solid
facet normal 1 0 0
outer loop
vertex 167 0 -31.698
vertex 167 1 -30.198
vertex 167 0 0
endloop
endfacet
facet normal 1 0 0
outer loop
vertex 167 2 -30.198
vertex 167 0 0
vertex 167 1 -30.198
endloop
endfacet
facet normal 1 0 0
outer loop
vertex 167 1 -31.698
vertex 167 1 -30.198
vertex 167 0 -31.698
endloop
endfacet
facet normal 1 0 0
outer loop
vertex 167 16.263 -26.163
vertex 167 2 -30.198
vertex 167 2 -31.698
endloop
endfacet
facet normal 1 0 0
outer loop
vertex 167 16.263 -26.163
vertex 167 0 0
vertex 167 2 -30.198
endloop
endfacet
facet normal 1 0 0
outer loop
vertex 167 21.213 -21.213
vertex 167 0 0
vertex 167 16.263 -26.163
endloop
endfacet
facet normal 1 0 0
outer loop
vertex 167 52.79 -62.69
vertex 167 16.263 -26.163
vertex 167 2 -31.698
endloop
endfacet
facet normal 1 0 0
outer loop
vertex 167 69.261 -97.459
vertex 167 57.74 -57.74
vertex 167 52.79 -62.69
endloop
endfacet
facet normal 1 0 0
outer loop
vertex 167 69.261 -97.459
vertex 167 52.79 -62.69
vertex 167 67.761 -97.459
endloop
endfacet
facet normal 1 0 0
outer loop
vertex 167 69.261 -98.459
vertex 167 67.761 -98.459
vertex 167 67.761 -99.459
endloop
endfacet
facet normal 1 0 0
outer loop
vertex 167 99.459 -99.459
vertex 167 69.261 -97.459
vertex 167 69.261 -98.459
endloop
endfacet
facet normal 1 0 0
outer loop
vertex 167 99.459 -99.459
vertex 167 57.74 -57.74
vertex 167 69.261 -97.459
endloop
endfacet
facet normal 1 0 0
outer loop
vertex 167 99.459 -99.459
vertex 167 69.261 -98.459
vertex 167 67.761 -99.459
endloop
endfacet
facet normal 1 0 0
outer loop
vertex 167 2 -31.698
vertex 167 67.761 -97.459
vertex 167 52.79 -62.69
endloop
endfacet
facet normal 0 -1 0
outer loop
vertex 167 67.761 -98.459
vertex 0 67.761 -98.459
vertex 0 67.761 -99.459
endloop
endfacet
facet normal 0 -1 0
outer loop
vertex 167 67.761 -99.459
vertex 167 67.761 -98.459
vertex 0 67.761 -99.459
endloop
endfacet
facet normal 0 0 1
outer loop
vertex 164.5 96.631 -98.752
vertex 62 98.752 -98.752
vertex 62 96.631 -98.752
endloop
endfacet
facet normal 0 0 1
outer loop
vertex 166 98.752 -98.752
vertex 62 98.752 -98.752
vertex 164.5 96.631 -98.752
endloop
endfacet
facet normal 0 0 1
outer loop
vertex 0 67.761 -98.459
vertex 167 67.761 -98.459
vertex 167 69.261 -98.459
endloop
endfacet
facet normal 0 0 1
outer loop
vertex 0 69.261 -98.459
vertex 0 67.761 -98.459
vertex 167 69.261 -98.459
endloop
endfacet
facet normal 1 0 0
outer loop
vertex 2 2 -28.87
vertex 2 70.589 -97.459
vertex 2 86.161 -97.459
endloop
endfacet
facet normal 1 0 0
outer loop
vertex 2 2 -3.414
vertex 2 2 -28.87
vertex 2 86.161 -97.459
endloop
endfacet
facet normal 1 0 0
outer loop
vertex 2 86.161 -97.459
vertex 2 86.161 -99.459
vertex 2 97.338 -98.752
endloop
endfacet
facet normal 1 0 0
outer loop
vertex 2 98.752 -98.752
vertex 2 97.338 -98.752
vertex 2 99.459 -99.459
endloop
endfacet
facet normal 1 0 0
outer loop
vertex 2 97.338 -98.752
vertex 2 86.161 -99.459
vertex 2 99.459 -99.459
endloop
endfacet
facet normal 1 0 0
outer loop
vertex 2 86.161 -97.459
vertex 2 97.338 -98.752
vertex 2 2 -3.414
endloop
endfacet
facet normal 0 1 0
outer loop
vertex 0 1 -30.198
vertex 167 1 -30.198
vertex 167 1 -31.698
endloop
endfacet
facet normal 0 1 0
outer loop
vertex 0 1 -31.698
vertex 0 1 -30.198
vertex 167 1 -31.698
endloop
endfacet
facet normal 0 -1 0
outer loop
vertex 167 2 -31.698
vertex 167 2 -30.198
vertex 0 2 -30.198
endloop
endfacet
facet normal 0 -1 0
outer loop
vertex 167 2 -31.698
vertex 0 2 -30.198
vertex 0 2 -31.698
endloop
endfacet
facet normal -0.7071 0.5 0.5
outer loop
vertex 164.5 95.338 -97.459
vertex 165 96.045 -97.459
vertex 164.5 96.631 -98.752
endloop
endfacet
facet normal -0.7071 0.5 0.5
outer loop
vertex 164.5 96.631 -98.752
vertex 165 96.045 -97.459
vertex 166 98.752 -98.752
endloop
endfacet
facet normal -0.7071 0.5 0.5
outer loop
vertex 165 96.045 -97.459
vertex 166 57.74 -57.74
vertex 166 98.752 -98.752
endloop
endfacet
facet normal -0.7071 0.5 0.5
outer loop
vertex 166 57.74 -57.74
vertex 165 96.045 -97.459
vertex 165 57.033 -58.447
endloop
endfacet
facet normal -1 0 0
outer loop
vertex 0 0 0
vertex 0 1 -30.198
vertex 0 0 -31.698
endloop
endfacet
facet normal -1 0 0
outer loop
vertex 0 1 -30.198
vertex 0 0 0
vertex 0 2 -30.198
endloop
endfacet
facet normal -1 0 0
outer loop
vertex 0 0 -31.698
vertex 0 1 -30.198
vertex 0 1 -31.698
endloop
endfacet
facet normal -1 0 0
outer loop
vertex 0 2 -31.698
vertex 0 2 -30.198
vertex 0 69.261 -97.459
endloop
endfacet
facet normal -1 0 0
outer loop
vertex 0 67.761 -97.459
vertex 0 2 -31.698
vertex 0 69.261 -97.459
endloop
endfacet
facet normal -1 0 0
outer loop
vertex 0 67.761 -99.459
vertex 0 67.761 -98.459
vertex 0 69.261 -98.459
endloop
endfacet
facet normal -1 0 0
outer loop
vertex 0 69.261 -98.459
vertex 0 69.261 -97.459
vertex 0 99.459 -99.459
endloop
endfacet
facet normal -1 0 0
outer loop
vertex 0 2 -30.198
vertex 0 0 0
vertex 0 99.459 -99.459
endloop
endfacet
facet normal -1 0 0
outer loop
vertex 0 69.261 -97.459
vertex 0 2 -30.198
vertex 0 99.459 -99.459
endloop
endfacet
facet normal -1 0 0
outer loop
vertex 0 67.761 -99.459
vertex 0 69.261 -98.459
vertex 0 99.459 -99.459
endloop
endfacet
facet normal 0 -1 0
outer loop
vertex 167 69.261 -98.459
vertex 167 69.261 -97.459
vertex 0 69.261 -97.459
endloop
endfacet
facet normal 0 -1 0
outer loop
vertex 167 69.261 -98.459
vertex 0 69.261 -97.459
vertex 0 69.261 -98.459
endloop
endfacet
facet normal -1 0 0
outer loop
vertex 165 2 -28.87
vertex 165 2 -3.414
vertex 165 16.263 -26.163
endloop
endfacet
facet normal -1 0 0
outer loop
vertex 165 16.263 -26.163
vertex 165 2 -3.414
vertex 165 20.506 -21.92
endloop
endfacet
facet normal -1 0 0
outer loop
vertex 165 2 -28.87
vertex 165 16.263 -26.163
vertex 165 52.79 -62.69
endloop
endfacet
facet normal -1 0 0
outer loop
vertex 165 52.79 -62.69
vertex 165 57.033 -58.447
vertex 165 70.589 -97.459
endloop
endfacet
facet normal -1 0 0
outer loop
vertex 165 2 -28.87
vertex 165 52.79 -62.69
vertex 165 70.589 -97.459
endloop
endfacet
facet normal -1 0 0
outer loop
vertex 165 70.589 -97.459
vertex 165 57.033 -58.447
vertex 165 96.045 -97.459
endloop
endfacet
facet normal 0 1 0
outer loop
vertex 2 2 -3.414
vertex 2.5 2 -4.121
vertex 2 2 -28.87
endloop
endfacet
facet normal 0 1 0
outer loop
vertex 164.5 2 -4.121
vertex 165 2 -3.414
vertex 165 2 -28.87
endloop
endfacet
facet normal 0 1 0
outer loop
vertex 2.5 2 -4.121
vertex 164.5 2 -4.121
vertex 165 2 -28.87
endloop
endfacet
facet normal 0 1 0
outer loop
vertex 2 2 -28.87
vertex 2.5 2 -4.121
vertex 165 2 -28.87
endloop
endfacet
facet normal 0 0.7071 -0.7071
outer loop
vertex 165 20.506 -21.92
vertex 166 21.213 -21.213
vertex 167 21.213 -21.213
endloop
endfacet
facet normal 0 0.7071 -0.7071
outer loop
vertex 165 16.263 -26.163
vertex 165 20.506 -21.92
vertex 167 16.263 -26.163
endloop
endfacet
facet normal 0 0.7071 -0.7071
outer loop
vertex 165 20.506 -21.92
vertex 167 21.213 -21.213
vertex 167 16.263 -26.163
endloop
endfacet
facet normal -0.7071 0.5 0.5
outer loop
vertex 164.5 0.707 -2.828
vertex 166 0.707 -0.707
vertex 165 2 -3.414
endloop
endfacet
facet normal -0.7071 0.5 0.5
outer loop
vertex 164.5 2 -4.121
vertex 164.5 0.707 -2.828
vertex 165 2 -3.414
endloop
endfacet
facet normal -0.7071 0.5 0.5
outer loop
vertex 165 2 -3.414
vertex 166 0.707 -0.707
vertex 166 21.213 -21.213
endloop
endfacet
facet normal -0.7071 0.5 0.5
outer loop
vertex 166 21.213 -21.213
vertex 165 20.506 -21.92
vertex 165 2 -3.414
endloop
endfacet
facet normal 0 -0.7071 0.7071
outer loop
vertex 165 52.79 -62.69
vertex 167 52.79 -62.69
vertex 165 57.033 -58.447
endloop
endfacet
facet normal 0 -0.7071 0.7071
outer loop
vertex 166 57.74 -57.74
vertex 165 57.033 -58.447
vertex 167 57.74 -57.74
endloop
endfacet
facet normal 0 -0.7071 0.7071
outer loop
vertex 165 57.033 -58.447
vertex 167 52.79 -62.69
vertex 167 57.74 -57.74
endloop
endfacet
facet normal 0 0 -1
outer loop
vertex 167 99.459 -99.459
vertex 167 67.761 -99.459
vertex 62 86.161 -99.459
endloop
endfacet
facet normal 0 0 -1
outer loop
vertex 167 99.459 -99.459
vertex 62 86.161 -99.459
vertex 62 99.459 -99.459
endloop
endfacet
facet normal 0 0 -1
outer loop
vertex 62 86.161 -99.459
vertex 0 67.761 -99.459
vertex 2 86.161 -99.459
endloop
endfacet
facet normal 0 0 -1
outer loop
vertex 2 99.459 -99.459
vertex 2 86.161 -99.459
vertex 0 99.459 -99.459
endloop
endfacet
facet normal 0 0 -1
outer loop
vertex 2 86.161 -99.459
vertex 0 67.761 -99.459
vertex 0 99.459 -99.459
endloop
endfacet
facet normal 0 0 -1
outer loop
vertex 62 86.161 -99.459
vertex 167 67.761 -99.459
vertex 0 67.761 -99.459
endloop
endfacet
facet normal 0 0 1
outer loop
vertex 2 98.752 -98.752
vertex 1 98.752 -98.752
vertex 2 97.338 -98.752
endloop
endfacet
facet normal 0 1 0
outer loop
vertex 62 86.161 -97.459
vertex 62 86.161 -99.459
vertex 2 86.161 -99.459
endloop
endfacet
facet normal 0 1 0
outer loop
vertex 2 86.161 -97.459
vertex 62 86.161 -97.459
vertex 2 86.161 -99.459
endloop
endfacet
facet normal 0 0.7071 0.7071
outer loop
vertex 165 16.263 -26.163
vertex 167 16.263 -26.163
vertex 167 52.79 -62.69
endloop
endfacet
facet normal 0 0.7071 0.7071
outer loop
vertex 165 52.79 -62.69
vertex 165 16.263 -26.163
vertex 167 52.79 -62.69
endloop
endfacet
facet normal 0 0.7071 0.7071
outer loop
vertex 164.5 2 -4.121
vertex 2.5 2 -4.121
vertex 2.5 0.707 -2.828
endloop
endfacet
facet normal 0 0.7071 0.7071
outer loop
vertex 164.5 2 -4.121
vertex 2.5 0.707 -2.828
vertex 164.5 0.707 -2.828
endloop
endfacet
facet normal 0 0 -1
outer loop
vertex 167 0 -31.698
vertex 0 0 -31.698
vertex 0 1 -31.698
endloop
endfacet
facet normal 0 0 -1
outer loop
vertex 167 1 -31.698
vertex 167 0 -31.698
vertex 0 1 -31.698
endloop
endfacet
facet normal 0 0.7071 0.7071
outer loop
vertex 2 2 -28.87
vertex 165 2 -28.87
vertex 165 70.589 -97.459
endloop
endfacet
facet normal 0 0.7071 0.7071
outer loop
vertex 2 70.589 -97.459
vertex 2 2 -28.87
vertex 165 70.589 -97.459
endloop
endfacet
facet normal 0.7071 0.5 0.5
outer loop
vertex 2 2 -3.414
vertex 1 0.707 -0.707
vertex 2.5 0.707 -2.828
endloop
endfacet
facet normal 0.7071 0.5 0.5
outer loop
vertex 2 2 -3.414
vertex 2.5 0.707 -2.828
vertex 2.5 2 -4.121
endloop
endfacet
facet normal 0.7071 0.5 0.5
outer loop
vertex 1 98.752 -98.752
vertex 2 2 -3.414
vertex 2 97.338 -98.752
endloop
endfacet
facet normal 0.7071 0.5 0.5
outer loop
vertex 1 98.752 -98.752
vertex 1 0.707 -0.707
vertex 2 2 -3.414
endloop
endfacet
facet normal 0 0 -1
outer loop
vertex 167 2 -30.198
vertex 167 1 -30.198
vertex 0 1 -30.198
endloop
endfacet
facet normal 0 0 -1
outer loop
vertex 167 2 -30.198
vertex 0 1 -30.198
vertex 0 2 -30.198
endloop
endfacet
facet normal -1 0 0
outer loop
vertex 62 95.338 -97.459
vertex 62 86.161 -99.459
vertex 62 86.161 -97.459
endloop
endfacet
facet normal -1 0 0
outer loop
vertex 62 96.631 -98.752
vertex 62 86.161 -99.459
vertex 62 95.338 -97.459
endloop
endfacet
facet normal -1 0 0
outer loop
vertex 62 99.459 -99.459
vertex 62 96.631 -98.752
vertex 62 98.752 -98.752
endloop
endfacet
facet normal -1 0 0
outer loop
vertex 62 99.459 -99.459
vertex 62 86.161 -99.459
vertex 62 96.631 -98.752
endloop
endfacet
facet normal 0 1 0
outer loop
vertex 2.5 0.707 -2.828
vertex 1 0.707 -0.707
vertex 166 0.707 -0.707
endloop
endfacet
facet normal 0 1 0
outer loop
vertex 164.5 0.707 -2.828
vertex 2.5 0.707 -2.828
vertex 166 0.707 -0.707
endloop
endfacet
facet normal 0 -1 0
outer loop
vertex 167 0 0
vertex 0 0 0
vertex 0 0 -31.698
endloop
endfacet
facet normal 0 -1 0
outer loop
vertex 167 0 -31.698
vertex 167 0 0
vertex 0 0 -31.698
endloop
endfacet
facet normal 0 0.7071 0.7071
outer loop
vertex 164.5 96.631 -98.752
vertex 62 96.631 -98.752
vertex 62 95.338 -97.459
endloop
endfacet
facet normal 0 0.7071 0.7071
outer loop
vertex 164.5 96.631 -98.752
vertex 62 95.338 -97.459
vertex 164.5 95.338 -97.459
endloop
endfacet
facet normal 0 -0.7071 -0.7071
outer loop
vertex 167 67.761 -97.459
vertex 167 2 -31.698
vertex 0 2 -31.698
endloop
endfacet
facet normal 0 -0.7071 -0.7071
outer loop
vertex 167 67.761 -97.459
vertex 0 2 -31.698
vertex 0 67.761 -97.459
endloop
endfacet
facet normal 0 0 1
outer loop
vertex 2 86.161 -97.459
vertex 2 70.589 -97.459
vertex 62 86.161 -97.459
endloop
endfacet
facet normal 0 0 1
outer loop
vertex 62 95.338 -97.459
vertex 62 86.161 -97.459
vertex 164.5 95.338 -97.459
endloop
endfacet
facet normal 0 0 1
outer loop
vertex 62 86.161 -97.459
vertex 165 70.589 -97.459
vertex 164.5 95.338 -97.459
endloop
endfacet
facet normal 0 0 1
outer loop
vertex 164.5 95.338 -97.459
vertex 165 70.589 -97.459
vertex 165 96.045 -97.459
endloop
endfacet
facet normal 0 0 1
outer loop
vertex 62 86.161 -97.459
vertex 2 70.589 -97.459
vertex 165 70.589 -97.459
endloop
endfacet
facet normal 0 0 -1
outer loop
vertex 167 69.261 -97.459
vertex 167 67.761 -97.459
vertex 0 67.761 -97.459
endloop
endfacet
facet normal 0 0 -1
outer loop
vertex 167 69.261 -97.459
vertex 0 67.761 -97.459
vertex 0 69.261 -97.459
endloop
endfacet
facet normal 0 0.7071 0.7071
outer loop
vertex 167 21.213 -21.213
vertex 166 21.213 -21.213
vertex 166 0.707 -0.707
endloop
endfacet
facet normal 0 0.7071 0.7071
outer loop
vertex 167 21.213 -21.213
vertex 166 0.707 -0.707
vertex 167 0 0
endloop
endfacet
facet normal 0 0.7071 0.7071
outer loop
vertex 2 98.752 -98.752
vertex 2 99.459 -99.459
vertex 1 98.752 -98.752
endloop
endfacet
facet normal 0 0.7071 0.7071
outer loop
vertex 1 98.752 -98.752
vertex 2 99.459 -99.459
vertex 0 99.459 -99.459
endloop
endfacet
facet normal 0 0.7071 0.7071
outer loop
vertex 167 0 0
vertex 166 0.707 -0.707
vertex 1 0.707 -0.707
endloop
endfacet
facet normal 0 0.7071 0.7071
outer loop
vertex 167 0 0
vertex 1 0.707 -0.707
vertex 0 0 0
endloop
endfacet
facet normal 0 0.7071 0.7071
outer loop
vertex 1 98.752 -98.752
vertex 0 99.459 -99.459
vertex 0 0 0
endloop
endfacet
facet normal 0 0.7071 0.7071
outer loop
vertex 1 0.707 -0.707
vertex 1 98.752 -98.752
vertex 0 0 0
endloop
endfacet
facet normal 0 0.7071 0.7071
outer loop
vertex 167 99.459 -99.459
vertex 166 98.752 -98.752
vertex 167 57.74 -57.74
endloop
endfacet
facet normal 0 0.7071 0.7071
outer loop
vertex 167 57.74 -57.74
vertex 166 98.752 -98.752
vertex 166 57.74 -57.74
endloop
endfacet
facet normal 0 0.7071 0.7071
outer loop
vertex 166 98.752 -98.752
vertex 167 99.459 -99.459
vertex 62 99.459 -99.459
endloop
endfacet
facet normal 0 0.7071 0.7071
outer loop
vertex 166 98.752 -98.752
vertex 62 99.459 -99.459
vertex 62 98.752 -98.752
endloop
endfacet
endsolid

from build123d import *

# Parameters (mm, degrees)
BOSS_EXTRUDE2_DEPTH   = 167
CUT_EXTRUDE2_START    = -2
CUT_EXTRUDE2_DEPTH    = 163
SKETCH6_W             = 1
SKETCH6_H             = 1.5
SKETCH6_W_2           = 1.5
SKETCH6_H_2           = 1
BASE_SLOTS_DEPTH      = 219.342278653
SKETCH7_W             = 165
SKETCH7_H             = 138.656854249
COVER_SLOTS_DEPTH     = 1.5
COVER_SLOTS_DRAFT     = -45
USB_C_SLOTS_REACH     = 220.342
SCREEN_OVERHANG_REACH = 220.342
SKETCH9_W             = 60
SKETCH9_H             = 13.29848481


with BuildPart() as part:
    # Sketch1 → Boss-Extrude2 (new body)
    with BuildSketch(Plane(origin=(0, 0, 0), x_dir=(0, 0, -1), z_dir=(1, 0, 0))):
        Polygon((0, 0), (31.69848481, 0), (31.69848481, 2), (97.45941546, 67.76093065), (99.45941546, 67.76093065), (99.45941546, 99.45941546), align=None)
    extrude(amount=BOSS_EXTRUDE2_DEPTH)

    # Sketch5 → Cut-Extrude2 (cut)
    with BuildSketch(Plane(origin=(167, 0, 0), x_dir=(0, 0, -1), z_dir=(1, 0, 0)).offset(CUT_EXTRUDE2_START)):
        Polygon((97.45941546, 97.45941546), (2, 2), (28.870057685, 2), (97.45941546, 70.589357775), align=None)
    extrude(amount=-CUT_EXTRUDE2_DEPTH, mode=Mode.SUBTRACT)

    # Sketch6 → Base Slots (cut, through all)
    with BuildSketch(Plane(origin=(167, 0, 0), x_dir=(0, 0, -1), z_dir=(1, 0, 0))):
        with Locations((97.95941546, 68.51093065)):
            Rectangle(SKETCH6_W, SKETCH6_H)
        with Locations((30.94848481, 1.5)):
            Rectangle(SKETCH6_W_2, SKETCH6_H_2)
    extrude(amount=-BASE_SLOTS_DEPTH, mode=Mode.SUBTRACT)


with BuildPart() as cover_slots_tool:
    # Sketch7 → Cover slots (with draft: the straight prism first)
    with BuildSketch(Plane(origin=(0, 0, 0), x_dir=(1, 0, 0), z_dir=(0, 0.707106781186551, 0.7071067811865441))):
        with Locations((83.5, 70.328427125)):
            Rectangle(SKETCH7_W, SKETCH7_H)
    extrude(amount=-COVER_SLOTS_DEPTH)
    # Cover slots: the draft: its side faces are tilted about the plane it starts from
    cover_slots_sides = [cover_slots_tool.faces().sort_by_distance(p)[0] for p in [
        (1, 49.199377644, -50.260037816),
        (83.5, 0.176776695, -1.237436867),
        (166, 49.199377644, -50.260037816),
        (83.5, 98.221978593, -99.282638765),
    ]]
    draft(cover_slots_sides, Plane(origin=(0, 0, 0), x_dir=(1, 0, 0), z_dir=(0, 0.707106781186551, 0.7071067811865441)), COVER_SLOTS_DRAFT)


with BuildPart() as part_1:
    add(part.part)

    # Cover slots: cut by cover_slots_tool
    add(cover_slots_tool.part, mode=Mode.SUBTRACT)

    # Sketch8 → USB C Slots (cut, up to next)
    with BuildSketch(Plane(origin=(167, 0, 0), x_dir=(0, 0, -1), z_dir=(1, 0, 0)), mode=Mode.PRIVATE) as usb_c_slots_sk1:
        Polygon((26.162950904, 16.263455967), (62.689862838, 52.790367902), (57.74011537, 57.74011537), (21.213203436, 21.213203436), align=None)
    usb_c_slots_tool1 = extrude(usb_c_slots_sk1.sketch, amount=-USB_C_SLOTS_REACH, mode=Mode.PRIVATE) & part_1.part
    add(usb_c_slots_tool1.solids().sort_by_distance((167, 37.001786, -41.951533))[0], mode=Mode.SUBTRACT)

    # Sketch9 → Screen Overhang (cut, up to next)
    with BuildSketch(Plane(origin=(0, 0, -99.45941546), x_dir=(-1, 0, 0), z_dir=(0, 0, -1)), mode=Mode.PRIVATE) as screen_overhang_sk1:
        with Locations((-32, 92.810173055)):
            Rectangle(SKETCH9_W, SKETCH9_H)
    screen_overhang_tool1 = extrude(screen_overhang_sk1.sketch, amount=-SCREEN_OVERHANG_REACH, mode=Mode.PRIVATE) & part_1.part
    add(screen_overhang_tool1.solids().sort_by_distance((32, 92.810173, -99.459415))[0], mode=Mode.SUBTRACT)


solid = part_1.part
